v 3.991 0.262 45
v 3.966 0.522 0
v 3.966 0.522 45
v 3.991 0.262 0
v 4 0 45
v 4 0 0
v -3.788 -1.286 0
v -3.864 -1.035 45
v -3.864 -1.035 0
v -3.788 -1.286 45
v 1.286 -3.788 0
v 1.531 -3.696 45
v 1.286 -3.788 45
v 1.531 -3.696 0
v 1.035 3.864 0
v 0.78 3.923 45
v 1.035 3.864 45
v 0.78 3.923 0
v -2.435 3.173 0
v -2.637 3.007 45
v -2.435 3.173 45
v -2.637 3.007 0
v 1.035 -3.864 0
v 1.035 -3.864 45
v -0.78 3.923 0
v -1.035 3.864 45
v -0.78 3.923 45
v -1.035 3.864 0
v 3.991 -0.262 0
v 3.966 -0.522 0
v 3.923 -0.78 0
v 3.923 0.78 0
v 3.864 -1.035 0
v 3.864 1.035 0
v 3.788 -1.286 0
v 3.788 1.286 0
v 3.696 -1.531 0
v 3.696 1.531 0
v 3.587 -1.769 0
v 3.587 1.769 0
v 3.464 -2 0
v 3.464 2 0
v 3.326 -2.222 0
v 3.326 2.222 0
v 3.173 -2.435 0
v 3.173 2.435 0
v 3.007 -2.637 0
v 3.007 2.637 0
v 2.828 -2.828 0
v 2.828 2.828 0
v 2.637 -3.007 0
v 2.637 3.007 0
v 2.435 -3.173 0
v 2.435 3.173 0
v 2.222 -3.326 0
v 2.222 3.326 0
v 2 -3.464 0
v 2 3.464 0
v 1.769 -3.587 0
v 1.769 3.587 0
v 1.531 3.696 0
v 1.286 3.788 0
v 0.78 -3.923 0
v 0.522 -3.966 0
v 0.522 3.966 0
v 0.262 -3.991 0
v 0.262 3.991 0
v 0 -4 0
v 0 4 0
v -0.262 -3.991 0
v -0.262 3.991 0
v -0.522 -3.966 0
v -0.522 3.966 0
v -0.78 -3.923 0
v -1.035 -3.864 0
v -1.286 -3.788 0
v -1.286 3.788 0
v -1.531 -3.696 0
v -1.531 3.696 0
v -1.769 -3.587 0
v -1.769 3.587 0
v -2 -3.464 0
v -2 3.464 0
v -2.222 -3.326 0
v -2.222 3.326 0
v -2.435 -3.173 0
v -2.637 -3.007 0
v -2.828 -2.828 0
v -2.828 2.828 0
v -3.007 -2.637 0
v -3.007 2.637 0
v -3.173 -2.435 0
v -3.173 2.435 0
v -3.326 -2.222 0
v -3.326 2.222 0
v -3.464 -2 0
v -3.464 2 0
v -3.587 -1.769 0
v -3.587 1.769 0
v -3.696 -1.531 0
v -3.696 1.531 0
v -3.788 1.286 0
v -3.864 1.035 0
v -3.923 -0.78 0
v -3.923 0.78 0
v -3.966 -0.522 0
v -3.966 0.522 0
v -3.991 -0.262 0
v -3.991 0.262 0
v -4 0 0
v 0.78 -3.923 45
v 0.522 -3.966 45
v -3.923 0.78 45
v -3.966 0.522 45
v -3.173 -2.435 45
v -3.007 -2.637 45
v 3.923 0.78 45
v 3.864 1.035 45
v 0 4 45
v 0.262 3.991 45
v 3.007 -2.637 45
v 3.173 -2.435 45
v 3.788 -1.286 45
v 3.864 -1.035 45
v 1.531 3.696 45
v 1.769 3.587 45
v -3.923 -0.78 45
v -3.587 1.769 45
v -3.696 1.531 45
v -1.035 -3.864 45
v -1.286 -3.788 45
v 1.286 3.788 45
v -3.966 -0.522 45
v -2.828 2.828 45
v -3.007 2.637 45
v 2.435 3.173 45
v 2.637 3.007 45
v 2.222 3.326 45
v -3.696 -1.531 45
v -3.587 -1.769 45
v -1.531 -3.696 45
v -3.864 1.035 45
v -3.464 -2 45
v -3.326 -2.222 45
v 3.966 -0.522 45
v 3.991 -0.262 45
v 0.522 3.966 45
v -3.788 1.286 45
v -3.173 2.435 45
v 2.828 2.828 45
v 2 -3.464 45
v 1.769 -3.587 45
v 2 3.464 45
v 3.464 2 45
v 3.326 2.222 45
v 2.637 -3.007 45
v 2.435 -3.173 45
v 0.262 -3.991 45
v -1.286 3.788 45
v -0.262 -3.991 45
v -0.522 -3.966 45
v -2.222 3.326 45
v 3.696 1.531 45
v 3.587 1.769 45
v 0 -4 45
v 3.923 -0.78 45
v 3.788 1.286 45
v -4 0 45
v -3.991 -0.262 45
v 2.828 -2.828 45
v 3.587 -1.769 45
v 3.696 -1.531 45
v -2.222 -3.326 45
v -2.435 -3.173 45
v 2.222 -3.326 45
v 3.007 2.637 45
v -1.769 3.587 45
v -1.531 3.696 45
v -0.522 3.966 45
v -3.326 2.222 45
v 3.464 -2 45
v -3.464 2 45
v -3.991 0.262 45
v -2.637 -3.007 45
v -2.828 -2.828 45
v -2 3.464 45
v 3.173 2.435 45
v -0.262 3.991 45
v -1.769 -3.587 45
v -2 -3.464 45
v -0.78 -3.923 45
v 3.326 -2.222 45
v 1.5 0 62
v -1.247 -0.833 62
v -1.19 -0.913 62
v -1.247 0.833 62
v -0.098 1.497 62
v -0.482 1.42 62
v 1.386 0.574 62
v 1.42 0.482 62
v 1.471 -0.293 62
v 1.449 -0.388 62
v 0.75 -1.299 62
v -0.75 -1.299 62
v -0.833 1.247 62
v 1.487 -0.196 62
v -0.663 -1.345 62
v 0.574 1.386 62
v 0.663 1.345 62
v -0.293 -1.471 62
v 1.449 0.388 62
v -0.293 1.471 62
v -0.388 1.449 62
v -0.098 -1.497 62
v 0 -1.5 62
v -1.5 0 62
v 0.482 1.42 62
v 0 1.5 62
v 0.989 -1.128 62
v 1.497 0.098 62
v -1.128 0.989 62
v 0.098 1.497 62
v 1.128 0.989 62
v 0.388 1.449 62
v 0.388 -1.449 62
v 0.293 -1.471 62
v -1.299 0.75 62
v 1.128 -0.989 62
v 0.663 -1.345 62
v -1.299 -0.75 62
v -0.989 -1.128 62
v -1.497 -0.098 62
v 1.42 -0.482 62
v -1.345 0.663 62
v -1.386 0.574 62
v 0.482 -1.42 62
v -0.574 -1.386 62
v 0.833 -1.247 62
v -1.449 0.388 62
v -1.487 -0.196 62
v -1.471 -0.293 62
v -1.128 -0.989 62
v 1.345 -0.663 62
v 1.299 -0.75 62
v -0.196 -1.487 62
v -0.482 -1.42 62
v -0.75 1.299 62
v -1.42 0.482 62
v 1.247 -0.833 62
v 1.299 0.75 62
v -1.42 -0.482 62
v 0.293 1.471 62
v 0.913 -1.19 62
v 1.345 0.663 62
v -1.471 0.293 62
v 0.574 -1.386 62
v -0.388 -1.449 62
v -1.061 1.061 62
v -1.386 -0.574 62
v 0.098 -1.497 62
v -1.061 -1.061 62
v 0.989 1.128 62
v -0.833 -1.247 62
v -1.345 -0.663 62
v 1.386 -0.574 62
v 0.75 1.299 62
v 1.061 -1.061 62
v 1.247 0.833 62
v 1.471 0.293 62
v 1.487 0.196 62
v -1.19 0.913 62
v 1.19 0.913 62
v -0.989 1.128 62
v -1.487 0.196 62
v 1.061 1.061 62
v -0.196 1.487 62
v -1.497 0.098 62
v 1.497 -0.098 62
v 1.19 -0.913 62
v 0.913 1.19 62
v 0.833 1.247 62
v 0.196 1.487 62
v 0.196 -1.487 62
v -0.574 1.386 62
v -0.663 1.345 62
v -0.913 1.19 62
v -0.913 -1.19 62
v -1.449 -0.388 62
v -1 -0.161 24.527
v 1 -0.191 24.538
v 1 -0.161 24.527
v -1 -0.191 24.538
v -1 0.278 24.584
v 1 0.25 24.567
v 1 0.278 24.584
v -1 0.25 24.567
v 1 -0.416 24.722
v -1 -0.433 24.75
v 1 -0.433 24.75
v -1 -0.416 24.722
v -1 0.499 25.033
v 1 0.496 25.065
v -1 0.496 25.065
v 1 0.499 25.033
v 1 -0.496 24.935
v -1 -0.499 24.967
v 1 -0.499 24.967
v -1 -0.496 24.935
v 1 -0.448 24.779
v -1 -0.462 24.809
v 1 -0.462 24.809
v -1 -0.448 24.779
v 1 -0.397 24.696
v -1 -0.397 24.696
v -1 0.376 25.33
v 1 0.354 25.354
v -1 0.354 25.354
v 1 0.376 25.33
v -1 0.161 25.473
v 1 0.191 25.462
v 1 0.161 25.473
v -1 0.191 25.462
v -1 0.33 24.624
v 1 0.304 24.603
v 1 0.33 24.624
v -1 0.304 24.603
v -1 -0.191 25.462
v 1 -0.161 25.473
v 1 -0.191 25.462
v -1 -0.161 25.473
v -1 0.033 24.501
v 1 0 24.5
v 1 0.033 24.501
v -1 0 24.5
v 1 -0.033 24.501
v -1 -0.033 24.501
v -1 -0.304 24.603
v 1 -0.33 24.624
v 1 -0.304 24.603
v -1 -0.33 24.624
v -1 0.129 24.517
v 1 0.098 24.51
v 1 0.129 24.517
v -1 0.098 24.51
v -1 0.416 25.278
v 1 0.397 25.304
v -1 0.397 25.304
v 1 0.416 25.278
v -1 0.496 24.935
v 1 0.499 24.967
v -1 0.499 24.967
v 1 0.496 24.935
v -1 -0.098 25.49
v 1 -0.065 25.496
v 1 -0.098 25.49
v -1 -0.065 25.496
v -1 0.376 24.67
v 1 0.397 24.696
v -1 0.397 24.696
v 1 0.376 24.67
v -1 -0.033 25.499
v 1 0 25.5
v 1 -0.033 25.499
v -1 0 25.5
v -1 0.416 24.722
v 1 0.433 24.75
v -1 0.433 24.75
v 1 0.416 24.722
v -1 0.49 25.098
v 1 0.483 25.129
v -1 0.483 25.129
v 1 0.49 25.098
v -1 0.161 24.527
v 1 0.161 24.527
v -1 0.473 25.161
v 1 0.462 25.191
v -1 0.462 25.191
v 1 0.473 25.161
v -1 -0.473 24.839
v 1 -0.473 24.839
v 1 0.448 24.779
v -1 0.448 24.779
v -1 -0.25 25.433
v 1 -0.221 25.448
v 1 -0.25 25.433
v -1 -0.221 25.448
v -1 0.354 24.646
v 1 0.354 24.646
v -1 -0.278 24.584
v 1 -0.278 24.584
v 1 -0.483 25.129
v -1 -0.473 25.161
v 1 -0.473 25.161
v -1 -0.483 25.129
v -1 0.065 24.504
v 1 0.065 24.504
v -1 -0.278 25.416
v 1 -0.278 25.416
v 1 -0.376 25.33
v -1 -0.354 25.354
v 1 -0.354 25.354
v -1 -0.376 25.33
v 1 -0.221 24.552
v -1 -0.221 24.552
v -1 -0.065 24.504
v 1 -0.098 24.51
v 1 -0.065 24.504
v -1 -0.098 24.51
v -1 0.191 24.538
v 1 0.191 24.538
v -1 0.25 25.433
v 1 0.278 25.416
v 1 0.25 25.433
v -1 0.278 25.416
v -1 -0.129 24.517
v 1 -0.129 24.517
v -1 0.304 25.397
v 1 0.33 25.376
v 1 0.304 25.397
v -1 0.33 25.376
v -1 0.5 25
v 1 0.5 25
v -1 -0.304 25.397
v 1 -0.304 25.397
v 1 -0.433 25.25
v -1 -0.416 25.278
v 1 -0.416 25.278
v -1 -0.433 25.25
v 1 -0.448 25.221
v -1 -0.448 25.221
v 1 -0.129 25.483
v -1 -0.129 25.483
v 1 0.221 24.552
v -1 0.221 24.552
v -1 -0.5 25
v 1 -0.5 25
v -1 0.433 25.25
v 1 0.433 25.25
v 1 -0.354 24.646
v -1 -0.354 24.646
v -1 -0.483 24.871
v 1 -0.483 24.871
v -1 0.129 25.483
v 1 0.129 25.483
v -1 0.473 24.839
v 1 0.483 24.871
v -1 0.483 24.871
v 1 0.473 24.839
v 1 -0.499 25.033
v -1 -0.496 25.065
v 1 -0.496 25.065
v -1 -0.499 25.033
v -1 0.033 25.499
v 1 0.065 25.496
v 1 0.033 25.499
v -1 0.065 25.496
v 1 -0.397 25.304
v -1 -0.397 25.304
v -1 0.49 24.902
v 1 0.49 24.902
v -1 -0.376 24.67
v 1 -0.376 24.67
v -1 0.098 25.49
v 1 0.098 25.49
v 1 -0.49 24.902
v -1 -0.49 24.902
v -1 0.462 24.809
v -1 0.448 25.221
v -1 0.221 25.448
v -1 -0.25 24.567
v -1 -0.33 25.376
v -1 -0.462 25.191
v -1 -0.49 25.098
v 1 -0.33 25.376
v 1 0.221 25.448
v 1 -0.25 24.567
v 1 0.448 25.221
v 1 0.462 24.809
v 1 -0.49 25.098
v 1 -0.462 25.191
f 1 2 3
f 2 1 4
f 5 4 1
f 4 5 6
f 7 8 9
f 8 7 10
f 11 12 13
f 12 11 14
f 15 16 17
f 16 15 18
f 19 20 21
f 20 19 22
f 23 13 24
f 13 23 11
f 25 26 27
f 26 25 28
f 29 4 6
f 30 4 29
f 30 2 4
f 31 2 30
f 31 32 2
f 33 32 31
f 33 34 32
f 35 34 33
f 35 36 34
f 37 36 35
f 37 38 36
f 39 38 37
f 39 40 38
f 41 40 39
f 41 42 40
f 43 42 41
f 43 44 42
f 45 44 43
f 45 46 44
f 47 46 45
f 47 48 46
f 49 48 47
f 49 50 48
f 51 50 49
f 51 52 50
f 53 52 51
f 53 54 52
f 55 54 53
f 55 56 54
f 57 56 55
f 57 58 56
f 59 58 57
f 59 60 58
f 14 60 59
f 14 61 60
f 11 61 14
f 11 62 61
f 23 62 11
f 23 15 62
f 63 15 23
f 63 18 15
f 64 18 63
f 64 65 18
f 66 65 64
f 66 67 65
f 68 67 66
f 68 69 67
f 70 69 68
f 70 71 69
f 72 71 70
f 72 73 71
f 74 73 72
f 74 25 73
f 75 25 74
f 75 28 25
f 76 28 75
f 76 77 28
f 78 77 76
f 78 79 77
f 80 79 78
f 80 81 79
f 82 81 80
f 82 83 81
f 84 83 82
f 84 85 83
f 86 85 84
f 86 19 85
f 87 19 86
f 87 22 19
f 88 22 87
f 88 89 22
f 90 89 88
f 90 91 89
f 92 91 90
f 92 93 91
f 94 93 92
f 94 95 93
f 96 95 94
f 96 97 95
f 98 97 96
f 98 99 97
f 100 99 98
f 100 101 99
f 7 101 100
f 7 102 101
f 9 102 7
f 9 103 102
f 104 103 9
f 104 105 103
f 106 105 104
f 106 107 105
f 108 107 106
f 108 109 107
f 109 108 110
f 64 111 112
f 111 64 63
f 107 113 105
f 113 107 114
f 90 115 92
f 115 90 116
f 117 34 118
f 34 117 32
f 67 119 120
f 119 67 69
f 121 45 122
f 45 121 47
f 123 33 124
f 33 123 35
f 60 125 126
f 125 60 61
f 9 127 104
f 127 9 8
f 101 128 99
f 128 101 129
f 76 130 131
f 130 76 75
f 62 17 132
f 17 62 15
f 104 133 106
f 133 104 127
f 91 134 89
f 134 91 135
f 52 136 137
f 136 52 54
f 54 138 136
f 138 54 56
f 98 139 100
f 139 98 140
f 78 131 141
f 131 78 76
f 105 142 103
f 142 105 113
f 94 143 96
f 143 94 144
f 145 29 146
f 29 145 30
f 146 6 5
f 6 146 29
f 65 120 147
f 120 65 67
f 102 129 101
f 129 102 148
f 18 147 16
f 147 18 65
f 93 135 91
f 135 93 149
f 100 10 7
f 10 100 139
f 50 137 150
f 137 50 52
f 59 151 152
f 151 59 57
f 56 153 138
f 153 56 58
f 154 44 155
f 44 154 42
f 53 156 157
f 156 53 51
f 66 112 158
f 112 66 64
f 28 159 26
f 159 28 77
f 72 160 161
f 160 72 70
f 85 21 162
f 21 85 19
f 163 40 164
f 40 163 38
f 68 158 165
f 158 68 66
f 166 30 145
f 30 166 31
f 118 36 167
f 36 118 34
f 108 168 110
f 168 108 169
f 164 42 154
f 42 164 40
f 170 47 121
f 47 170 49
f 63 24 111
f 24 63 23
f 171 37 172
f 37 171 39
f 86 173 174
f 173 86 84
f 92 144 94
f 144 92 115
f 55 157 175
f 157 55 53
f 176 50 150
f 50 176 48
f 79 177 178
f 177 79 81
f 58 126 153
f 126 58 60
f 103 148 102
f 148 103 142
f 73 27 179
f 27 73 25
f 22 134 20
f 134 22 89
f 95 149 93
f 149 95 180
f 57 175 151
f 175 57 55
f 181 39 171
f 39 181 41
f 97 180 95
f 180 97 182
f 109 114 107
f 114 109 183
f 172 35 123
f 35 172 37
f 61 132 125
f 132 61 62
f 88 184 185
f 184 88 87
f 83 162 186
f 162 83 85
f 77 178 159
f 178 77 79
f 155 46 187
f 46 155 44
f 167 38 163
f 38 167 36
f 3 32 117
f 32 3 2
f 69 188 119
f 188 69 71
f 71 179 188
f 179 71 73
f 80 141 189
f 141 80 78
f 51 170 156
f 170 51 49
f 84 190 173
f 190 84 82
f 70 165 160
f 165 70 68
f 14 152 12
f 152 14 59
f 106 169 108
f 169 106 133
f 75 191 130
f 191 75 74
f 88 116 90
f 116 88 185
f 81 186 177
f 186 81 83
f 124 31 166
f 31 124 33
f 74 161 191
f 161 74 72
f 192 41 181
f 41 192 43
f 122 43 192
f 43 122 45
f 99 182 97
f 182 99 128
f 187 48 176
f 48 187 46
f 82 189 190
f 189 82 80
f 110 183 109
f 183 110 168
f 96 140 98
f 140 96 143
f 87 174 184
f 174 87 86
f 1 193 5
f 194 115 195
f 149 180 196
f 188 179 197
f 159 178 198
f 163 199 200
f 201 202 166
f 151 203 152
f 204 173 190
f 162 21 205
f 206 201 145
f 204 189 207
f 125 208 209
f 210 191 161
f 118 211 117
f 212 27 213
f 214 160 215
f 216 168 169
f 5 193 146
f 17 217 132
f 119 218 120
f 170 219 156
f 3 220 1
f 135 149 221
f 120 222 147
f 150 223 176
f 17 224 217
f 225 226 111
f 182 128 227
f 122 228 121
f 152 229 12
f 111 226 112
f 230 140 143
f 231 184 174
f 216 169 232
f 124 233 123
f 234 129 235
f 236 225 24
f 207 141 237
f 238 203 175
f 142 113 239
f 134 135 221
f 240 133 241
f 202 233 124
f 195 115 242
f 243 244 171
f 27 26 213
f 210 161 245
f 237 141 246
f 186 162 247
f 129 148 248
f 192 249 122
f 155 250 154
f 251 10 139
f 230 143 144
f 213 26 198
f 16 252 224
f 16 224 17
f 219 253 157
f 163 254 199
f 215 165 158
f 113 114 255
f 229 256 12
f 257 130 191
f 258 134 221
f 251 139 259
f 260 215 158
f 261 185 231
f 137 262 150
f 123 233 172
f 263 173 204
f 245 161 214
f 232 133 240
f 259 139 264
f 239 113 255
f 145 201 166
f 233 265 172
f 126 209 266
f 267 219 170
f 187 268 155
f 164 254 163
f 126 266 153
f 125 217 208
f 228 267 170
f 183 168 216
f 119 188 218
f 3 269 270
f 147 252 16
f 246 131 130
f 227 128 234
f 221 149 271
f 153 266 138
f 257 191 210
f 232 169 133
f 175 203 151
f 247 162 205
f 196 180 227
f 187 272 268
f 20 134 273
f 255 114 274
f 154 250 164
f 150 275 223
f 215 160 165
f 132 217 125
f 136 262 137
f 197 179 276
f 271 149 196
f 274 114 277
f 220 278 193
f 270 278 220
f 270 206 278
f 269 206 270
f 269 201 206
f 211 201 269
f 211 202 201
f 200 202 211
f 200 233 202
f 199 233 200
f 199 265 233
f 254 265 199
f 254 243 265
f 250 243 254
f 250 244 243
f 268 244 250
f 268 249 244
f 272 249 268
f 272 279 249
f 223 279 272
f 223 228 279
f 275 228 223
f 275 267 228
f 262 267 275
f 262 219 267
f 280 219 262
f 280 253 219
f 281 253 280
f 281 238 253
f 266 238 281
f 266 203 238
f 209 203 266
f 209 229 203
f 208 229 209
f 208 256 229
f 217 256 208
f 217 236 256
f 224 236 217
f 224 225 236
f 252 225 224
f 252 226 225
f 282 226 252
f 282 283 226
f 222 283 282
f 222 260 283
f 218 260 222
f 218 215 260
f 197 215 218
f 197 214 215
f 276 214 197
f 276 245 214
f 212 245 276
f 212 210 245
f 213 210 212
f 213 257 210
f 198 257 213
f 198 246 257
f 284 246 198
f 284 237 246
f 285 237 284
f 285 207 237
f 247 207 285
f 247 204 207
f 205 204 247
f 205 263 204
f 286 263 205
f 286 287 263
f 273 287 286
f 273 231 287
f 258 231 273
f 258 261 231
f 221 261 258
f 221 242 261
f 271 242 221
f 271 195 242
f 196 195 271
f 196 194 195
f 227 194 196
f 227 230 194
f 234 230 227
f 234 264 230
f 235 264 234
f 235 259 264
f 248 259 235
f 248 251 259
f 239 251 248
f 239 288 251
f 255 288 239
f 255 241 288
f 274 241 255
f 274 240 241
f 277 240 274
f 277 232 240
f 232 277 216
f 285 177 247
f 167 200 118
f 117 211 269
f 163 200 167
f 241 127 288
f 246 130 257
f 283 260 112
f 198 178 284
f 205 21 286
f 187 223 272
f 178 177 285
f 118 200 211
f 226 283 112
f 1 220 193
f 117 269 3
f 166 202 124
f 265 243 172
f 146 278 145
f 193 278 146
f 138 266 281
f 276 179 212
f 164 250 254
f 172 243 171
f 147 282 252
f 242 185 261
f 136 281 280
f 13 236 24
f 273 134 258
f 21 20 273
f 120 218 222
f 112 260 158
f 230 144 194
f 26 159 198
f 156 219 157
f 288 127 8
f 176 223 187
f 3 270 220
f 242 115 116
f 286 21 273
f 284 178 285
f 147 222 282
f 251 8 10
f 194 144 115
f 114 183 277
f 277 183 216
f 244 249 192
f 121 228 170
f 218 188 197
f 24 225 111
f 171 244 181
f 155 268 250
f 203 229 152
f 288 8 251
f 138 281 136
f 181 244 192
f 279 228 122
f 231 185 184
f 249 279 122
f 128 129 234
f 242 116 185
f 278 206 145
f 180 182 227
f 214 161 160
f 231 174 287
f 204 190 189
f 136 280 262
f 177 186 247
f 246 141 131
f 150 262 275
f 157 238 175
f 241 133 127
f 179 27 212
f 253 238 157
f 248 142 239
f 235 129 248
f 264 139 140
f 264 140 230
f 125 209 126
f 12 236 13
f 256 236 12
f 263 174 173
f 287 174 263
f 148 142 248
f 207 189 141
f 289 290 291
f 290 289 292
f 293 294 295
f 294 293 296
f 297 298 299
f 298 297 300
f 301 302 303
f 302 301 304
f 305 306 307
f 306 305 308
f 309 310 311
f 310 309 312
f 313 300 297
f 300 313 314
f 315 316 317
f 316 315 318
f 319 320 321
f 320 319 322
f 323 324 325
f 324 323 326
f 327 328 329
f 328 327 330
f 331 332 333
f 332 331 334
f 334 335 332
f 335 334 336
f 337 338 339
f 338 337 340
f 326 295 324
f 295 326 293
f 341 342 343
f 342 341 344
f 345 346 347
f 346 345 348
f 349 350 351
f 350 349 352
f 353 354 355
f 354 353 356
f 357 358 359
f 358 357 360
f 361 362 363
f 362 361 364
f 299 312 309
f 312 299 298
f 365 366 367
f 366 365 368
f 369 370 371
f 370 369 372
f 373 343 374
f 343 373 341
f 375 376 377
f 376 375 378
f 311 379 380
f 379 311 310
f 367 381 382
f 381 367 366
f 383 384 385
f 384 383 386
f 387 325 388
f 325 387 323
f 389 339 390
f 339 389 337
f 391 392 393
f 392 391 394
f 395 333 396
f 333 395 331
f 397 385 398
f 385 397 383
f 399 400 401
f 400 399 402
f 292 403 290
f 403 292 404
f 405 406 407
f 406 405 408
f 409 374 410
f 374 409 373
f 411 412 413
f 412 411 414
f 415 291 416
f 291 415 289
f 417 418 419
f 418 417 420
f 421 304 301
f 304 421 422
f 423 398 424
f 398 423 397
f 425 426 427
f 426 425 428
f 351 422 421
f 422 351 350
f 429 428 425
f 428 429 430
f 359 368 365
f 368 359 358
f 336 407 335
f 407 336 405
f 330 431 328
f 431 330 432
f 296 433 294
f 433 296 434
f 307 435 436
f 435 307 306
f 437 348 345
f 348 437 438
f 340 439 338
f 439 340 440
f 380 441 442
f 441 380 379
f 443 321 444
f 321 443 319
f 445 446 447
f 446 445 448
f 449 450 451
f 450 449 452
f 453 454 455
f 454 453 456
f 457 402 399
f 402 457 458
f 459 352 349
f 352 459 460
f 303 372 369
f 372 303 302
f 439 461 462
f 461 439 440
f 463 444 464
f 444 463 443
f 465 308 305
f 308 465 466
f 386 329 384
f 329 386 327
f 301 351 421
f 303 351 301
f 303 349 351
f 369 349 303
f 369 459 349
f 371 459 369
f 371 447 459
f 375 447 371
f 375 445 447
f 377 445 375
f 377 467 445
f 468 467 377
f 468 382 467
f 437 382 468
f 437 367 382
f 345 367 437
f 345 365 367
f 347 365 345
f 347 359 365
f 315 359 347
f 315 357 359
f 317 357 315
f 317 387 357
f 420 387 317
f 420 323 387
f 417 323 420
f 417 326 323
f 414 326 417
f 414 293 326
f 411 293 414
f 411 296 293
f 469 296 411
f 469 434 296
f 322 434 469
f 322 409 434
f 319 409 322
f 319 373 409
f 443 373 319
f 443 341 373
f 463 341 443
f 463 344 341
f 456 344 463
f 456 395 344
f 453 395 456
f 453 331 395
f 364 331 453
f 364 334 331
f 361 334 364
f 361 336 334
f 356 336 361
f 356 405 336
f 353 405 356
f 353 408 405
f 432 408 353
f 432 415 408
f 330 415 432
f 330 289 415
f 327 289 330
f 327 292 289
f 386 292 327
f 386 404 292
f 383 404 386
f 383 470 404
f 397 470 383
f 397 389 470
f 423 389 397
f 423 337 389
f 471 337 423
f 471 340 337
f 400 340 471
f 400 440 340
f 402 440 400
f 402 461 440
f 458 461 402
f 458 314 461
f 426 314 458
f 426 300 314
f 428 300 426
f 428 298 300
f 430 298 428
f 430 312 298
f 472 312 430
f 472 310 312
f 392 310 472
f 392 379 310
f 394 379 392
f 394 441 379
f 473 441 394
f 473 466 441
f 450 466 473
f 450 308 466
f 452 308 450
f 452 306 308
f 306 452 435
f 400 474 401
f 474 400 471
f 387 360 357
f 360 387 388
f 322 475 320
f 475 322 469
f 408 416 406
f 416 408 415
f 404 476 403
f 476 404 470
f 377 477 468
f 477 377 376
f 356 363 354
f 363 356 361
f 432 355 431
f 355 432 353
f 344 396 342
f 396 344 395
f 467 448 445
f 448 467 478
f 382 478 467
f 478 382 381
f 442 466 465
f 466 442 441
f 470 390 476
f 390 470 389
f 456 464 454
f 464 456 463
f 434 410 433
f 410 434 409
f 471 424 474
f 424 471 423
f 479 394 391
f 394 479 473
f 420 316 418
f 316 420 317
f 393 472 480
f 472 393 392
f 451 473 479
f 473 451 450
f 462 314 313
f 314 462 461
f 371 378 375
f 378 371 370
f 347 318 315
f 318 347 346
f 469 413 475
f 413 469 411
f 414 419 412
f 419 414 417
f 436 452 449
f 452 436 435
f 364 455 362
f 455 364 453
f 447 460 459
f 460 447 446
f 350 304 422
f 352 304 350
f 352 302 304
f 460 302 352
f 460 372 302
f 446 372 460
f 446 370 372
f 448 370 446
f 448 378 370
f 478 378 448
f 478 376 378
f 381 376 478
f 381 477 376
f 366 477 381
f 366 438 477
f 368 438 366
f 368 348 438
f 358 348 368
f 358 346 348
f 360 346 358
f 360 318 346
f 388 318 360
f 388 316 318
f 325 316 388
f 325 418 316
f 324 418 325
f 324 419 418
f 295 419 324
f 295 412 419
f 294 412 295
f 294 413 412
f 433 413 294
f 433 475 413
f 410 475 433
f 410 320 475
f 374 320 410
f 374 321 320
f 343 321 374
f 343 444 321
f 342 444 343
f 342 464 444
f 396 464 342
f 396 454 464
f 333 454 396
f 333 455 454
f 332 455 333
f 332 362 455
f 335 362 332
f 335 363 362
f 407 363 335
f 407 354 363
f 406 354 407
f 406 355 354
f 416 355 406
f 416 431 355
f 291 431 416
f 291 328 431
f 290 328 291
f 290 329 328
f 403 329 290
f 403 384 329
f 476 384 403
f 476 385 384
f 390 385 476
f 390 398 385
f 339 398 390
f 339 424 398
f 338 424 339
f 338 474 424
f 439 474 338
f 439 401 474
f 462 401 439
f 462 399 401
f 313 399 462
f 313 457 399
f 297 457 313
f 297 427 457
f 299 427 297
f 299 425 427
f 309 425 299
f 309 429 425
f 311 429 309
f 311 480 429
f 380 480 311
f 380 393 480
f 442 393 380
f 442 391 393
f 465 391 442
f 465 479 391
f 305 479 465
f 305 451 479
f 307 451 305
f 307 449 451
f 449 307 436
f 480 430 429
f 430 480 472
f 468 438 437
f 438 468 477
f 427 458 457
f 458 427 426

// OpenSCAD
// Tissue-pestle for 1.5 mL microcentrifuge tubes
// Print orientation: standing upright on the bed (z = 0), centred on the origin in X and Y.
// Units: millimetres.

// ---------------- Parameters ----------------
handle_d      = 8;    // handle diameter (also cone base diameter)
handle_h      = 45;   // handle height (z = 0 to z = 45)
cone_d        = 3;    // cone tip diameter (at z = 62)
cone_top_z    = 62;   // z where the cone meets the rounded tip
tip_d         = 3;    // rounded tip diameter (sphere)
tip_z         = 62;   // sphere centre height (z = cone_top_z)

groove_count  = 4;    // number of circumferential grooves on the handle
groove_w      = 2;    // groove width (in Z)
groove_depth  = 1;    // groove depth (in radial direction)
groove_z      = [10, 15, 20, 25]; // groove centre heights

eps           = 0.5;  // overshoot for clean boolean cuts
$fn           = 96;   // curve resolution

// ---------------- Model ----------------
difference() {
    union() {
        // (1) Cylindrical handle: z = 0 to z = 45
        cylinder(d = handle_d, h = handle_h);

        // (2) Tapering cone: diameter 8 at z = 45, down to 3 at z = 62
        translate([0, 0, handle_h])
            cylinder(d1 = handle_d, d2 = cone_d, h = cone_top_z - handle_h);

        // (3) Rounded tip: 3 mm diameter sphere centred at z = 62
        translate([0, 0, tip_z - tip_d / 2])
            sphere(d = tip_d);
    }

    // Grip grooves: circumferential cuts into the handle
    for (g = groove_count - 1) {
        translate([0, 0, groove_z[g]])
            rotate([0, 90, 0])
                cylinder(d = groove_depth, h = groove_w, center = true);
    }
}
